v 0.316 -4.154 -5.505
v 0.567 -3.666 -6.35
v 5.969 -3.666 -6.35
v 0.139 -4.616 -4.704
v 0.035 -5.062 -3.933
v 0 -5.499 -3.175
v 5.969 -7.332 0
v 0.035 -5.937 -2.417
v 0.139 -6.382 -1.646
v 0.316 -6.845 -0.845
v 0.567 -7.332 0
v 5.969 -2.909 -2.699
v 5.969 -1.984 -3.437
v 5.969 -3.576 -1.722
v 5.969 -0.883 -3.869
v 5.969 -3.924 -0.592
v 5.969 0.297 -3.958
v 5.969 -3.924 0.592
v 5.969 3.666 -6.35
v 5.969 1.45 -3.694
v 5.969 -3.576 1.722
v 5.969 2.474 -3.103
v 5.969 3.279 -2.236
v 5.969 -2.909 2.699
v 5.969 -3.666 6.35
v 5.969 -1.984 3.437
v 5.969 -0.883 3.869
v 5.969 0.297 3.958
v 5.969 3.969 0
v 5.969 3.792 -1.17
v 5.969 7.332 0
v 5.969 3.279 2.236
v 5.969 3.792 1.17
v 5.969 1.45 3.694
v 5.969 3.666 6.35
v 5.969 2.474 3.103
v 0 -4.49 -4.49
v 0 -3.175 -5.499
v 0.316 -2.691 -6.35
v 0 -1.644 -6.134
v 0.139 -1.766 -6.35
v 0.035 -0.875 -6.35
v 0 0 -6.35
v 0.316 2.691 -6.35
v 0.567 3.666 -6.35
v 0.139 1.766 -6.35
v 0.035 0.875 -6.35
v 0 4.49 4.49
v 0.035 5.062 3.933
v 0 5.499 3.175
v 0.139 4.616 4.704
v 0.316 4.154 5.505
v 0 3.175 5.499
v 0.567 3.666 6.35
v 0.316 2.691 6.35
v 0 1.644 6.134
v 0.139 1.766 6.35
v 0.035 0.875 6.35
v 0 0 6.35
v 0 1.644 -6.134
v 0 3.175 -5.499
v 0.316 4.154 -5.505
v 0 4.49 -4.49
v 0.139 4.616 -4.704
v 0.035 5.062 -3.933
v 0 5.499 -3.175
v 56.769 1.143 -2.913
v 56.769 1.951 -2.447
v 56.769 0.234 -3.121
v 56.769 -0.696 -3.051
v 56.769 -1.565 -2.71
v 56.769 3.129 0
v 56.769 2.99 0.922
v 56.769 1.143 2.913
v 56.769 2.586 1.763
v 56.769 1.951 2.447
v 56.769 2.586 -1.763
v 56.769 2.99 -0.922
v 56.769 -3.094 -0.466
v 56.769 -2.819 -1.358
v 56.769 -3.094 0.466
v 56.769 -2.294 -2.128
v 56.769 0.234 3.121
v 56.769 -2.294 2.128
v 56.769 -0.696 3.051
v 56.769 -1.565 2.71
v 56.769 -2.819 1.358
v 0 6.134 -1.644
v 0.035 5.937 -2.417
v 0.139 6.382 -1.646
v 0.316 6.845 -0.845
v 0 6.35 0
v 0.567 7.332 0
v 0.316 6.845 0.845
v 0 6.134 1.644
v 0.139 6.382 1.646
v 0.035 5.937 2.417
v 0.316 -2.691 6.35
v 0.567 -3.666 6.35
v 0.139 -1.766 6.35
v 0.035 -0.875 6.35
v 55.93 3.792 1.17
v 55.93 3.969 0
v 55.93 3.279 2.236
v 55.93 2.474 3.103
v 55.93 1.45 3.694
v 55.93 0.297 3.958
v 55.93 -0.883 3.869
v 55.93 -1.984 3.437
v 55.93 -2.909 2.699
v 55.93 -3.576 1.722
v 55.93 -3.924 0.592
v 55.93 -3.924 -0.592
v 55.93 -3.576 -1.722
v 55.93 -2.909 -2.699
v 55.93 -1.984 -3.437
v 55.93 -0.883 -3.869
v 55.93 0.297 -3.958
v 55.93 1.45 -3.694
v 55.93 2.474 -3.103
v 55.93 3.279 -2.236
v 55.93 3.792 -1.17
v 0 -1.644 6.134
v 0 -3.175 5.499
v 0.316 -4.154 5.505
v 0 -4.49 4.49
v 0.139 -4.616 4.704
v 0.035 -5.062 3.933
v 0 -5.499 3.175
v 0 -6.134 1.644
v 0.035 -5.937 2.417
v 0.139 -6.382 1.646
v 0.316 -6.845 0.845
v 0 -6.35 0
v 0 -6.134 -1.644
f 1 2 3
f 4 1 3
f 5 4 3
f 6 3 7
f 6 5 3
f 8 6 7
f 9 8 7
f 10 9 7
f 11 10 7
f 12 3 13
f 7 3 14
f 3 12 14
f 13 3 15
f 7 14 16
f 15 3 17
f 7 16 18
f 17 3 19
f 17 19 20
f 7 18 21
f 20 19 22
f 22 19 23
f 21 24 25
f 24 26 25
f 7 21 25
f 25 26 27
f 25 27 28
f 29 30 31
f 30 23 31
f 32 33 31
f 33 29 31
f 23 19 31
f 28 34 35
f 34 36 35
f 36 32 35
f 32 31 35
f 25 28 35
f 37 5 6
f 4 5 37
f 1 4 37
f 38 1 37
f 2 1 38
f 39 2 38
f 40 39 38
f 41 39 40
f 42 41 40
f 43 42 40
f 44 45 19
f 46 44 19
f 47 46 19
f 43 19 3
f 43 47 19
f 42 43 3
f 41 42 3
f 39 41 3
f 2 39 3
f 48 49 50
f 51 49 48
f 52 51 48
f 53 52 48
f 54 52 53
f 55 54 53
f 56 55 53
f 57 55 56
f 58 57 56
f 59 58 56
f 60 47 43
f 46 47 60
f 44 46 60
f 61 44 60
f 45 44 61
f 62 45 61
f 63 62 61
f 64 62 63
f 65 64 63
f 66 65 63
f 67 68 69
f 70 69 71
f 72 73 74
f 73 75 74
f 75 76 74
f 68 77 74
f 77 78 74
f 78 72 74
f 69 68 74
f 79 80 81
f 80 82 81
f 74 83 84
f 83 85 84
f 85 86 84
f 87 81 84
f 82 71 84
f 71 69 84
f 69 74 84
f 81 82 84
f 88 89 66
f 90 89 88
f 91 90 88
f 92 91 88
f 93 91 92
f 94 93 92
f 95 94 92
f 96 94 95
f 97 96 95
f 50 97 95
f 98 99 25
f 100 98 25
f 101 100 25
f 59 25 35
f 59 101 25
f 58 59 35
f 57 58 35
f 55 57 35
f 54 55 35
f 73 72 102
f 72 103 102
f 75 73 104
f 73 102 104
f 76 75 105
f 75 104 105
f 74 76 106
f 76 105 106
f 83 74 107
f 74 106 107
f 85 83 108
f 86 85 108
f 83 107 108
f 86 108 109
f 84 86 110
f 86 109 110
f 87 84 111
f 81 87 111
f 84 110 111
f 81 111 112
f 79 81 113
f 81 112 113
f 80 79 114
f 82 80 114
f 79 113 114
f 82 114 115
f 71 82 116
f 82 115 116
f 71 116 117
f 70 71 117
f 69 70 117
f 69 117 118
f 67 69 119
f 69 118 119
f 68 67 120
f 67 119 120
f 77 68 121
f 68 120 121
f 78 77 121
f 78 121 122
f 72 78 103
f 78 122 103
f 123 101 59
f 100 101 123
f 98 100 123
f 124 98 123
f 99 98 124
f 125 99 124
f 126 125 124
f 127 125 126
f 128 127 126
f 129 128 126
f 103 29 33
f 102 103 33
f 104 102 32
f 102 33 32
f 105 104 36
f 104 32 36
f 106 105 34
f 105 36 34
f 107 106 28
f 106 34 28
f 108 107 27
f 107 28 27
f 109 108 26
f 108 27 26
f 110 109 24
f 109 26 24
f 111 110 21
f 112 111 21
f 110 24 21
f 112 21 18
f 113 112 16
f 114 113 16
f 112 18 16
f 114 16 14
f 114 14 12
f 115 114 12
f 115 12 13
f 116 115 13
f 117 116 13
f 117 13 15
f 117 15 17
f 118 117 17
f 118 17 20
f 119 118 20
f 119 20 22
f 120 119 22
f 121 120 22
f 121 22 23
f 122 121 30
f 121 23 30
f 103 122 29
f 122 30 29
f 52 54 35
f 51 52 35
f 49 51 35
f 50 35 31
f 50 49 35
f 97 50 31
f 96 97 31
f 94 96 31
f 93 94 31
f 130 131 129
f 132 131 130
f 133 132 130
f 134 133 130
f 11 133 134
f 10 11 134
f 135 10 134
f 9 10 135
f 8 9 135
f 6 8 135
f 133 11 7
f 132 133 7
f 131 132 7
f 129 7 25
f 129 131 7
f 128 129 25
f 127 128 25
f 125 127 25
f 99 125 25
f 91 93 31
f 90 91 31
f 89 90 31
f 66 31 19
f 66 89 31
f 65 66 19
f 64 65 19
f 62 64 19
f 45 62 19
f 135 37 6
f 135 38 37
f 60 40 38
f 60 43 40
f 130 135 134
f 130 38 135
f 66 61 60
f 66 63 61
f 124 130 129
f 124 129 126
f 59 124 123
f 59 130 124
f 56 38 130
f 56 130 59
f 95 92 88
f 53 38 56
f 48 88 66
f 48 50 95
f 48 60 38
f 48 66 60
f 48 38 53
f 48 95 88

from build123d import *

# Parameters (mm, degrees)
BASEHEAD_DEPTH = 5.969


with BuildPart() as part:
    # Sketch1 → BaseHead (new body)
    with BuildSketch(Plane(origin=(0, 0, 0), x_dir=(0, 0, -1), z_dir=(1, 0, 0))):
        Polygon((6.35, 3.666174209), (6.35, -3.666174209), (0, -7.332348419), (-6.35, -3.666174209), (-6.35, 3.666174209), (0, 7.332348419), align=None)
    extrude(amount=BASEHEAD_DEPTH)

    # BodySke → BaseBody (revolve)
    with BuildSketch(Plane.XY):
        Polygon((0, 0), (56.769, 0), (56.769, 3.12928), (55.92953, 3.96875), (0, 3.96875), align=None)
    revolve(axis=Axis((0, 0, 0), (1, 0, 0)))

    # Sketch3 → HeadChamfer (revolve, cut)
    with BuildSketch(Plane.XY):
        Polygon((0, 6.35), (4.233333333, 13.682348419), (4.233333333, 20.032348419), (-12.7, 20.032348419), (-12.7, 6.35), align=None)
    revolve(axis=Axis((0, 0, 0), (1, 0, 0)), mode=Mode.SUBTRACT)


solid = part.part
